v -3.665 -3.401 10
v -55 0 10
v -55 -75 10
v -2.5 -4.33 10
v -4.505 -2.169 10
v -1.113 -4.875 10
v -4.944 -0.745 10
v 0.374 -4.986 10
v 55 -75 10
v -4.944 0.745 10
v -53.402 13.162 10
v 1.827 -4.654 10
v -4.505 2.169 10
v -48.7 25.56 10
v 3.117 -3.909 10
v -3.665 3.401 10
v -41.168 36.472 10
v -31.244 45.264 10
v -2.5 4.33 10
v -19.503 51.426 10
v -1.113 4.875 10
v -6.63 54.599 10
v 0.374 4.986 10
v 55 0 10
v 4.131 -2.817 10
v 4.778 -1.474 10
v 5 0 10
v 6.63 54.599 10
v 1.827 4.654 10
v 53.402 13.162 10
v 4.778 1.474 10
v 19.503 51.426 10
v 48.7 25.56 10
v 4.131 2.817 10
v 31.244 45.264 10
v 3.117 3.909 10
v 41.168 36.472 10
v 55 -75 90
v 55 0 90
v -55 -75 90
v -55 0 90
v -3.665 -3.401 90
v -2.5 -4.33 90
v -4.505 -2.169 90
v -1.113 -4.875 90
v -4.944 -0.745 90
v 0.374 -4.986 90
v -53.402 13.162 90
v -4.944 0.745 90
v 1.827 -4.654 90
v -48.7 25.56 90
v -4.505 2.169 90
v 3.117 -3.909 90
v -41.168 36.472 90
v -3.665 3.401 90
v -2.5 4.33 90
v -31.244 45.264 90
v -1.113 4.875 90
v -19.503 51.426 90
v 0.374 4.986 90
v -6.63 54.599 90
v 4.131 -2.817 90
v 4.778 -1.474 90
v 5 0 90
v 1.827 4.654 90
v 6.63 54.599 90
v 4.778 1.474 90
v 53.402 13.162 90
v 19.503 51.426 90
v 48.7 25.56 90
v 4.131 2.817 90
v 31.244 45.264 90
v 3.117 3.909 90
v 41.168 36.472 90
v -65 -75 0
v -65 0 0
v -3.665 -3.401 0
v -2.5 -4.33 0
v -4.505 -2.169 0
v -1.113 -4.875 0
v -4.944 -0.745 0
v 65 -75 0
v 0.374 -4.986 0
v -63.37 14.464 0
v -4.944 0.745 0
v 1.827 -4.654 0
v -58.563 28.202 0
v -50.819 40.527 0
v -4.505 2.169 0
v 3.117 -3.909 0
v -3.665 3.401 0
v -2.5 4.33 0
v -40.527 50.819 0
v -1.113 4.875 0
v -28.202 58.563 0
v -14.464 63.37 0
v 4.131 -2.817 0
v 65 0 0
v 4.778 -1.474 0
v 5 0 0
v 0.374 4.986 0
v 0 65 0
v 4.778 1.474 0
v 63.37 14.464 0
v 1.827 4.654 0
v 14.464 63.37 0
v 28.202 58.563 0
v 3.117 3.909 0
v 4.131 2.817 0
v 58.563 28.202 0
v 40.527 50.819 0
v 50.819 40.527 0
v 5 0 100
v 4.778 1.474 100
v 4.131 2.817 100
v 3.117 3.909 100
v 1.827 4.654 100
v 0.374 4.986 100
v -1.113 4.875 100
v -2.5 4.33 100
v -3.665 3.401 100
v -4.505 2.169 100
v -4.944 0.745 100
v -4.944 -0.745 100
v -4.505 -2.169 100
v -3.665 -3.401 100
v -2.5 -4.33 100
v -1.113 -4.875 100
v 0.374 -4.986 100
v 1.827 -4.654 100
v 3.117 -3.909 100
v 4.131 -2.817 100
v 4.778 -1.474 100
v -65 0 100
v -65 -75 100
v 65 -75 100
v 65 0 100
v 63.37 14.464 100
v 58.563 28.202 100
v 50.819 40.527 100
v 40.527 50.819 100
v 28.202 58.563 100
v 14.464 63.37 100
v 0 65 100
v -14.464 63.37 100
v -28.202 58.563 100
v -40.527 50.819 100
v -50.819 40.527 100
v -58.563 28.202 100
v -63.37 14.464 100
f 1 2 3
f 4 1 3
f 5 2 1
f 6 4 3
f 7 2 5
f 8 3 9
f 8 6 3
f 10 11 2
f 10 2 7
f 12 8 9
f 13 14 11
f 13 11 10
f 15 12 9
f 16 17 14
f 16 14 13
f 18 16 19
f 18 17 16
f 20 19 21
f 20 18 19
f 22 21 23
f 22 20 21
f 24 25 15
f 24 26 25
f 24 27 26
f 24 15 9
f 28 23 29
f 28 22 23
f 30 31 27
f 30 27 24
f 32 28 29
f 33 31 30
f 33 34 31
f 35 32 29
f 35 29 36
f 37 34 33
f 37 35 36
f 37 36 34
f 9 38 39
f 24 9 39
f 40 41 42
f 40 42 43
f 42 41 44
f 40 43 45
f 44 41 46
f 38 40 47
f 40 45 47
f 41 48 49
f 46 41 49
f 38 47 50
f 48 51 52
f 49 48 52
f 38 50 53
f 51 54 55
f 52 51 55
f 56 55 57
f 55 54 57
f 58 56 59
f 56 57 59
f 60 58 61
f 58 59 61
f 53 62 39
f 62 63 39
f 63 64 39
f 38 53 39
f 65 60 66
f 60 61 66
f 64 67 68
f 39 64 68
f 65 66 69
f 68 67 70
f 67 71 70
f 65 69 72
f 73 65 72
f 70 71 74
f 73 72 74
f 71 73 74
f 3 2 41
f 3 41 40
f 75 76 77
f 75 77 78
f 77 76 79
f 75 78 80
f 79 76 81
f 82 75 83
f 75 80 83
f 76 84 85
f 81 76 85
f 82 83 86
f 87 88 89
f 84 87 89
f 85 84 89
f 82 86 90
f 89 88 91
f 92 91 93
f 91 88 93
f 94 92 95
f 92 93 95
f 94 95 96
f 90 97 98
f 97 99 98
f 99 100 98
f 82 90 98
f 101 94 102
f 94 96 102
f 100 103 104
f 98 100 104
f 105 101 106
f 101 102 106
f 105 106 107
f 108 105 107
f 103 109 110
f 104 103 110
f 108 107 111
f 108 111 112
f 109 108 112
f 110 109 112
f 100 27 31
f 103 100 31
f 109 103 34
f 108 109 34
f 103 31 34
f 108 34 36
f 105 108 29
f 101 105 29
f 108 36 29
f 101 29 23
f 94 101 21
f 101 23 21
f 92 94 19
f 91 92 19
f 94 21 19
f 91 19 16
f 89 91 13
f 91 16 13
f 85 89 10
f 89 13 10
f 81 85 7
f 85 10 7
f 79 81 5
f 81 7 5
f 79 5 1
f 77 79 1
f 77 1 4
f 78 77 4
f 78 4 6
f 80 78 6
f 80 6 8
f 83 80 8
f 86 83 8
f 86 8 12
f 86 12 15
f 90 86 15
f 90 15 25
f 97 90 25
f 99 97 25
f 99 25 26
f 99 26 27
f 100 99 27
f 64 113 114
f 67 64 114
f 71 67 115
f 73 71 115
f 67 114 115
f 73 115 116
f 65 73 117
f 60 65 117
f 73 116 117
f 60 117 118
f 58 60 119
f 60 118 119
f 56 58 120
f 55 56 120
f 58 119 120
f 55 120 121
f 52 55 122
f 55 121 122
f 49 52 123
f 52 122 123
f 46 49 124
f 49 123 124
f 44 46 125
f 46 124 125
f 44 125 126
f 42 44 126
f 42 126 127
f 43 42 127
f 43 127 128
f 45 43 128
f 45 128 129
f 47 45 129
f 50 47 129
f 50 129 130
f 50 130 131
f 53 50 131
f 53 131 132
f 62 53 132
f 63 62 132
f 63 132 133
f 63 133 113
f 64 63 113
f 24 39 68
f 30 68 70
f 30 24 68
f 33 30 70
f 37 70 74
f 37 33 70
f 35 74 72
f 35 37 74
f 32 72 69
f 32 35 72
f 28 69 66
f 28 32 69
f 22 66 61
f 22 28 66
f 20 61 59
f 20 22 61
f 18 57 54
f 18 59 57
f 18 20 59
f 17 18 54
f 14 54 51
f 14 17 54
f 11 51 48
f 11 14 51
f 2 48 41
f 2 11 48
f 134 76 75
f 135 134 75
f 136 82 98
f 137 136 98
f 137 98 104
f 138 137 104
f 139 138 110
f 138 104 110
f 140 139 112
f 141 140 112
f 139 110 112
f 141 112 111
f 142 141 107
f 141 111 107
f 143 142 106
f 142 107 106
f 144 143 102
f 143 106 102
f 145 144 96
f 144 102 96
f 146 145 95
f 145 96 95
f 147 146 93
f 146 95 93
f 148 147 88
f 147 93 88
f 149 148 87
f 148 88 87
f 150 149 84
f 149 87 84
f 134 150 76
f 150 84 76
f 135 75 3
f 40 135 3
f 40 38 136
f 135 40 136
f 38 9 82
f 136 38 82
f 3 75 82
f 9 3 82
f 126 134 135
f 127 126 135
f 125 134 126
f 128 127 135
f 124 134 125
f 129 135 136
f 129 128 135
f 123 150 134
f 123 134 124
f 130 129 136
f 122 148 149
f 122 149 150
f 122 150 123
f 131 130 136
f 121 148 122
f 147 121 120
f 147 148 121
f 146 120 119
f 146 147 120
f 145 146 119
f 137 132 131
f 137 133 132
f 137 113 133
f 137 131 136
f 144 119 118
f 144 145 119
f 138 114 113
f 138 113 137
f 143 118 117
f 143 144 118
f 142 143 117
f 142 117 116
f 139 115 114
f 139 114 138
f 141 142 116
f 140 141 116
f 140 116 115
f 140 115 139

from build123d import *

# Parameters (mm, degrees)
SALIENTE_EXTRUIR1_DEPTH = 100
VACIADO1_T              = -10
CROQUIS4_R              = 5
CORTAR_EXTRUIR1_DEPTH   = 130


with BuildPart() as part:
    # Croquis1 → Saliente-Extruir1 (new body)
    with BuildSketch(Plane.XY):
        with BuildLine():
            Line((-65, 0), (-65, -65))
            Line((-65, -65), (-65, -75))
            Line((-65, -75), (0, -75))
            Line((0, -75), (65, -75))
            Line((65, -75), (65, -65))
            Line((65, -65), (65, 0))
            ThreePointArc((65, 0), (0, 65), (-65, 0))
        make_face()
    extrude(amount=SALIENTE_EXTRUIR1_DEPTH)

    # Vaciado1
    vaciado1_openings = [part.faces().sort_by_distance(p)[0] for p in [
        (0, -75, 50),
    ]]
    offset(amount=VACIADO1_T, openings=vaciado1_openings, kind=Kind.INTERSECTION)

    # Croquis4 → Cortar-Extruir1 (cut)
    with BuildSketch(Plane.XY.offset(100)):
        Circle(CROQUIS4_R)
    extrude(amount=-CORTAR_EXTRUIR1_DEPTH, mode=Mode.SUBTRACT)


solid = part.part
